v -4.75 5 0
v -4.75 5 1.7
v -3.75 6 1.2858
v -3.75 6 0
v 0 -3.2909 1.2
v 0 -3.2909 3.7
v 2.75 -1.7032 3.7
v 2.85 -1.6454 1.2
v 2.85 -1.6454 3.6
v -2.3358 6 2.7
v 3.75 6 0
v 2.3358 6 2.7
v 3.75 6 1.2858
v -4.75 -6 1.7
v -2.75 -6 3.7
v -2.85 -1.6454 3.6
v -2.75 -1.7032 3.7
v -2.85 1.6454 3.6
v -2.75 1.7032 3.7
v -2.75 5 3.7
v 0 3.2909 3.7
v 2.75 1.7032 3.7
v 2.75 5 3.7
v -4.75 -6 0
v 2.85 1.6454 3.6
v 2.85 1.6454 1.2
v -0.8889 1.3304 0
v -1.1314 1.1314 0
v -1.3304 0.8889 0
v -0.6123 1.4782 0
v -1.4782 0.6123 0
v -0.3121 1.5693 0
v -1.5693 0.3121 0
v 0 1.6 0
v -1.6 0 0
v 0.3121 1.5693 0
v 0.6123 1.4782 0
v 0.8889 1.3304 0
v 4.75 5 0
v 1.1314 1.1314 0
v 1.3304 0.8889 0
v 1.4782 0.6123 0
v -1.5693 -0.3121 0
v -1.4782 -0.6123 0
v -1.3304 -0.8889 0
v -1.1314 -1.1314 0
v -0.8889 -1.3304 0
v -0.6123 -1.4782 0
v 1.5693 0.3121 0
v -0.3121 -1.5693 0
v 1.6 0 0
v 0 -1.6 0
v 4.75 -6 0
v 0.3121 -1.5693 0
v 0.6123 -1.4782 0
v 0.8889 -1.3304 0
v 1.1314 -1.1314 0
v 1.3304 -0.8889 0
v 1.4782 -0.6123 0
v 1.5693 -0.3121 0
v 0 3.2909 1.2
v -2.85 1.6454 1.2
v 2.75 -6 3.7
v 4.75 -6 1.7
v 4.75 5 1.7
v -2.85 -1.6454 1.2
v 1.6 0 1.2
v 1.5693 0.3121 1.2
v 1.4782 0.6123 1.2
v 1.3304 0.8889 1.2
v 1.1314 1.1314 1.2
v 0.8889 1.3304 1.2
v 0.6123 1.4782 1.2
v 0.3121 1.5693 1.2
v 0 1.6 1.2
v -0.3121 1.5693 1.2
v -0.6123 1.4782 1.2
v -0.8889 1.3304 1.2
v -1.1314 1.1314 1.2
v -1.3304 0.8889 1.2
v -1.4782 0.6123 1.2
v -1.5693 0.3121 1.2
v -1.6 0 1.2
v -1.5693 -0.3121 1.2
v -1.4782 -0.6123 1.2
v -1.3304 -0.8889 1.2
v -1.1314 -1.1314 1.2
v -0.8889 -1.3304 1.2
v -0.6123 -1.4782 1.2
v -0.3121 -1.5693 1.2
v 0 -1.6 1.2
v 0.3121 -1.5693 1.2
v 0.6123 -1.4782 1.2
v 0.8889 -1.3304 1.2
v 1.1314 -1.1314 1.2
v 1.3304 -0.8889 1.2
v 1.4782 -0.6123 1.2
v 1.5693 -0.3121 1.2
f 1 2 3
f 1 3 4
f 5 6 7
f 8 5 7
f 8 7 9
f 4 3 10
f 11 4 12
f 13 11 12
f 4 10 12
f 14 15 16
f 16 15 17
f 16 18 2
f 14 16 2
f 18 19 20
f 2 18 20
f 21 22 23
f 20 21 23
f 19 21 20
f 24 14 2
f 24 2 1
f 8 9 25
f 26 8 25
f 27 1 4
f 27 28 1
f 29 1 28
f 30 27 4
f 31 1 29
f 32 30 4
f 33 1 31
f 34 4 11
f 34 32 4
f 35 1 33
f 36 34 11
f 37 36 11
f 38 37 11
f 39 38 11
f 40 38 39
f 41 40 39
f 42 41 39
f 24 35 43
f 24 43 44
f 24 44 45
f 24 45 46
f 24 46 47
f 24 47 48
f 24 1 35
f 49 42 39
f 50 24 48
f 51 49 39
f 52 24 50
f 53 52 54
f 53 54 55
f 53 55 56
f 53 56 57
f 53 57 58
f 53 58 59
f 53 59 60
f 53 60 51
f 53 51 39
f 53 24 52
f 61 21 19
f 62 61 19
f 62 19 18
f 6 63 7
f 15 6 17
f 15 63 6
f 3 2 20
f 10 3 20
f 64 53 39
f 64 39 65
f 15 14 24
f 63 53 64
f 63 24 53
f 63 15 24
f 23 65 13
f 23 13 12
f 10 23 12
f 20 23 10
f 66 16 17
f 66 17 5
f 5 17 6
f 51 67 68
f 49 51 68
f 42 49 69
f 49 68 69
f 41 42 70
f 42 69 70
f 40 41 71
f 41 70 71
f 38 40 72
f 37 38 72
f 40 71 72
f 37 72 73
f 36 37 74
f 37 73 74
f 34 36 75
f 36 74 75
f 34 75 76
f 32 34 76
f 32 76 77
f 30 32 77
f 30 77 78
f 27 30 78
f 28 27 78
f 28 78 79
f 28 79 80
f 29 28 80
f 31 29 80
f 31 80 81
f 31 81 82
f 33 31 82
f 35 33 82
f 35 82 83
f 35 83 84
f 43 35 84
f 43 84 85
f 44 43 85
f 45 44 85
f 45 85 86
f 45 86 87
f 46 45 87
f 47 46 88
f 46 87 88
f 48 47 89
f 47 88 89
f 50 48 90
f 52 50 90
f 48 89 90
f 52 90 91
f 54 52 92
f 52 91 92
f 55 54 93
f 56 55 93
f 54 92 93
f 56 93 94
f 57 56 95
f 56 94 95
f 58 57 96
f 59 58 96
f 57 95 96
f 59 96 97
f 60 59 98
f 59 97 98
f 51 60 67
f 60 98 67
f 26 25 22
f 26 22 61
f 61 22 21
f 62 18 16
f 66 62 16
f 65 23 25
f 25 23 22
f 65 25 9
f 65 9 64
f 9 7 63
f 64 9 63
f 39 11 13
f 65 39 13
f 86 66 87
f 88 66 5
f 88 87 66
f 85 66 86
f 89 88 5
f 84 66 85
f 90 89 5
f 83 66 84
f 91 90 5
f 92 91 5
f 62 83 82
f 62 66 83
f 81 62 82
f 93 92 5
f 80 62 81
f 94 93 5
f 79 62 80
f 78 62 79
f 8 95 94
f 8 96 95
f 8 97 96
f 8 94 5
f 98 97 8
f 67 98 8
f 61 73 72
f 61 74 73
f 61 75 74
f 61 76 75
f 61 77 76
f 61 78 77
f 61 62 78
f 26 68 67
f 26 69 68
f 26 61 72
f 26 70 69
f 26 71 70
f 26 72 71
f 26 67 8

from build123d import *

# Parameters (mm, degrees)
F1_DEPTH = 6
F2_R     = 1.6
F3_DEPTH = 3.7
F5_SIZE2 = 2
F5_SIZE  = 2
F6_DEPTH = 2.5
F7_SIZE  = 1


with BuildPart() as f1:
    # F0 (on Front) → F1 (new body, symmetric)
    with BuildSketch(Plane.XZ):
        Polygon((-4.75, 0), (0, 0), (4.75, 0), (4.75, 3.7), (-4.75, 3.7), align=None)
    extrude(amount=F1_DEPTH, both=True)

    # F2 (on face) → F3 (cut, through all)
    with BuildSketch(Plane.XY.offset(3.7)):
        Circle(F2_R)
    extrude(amount=-F3_DEPTH, mode=Mode.SUBTRACT)

    # F5
    f5_edges = [f1.edges().sort_by_distance(p)[0] for p in [
        (-4.75, 0, 3.7),
        (4.75, 0, 3.7),
    ]]
    chamfer(f5_edges, length=F5_SIZE, length2=F5_SIZE2)

    # F4 (on face) → F6 (cut)
    with BuildSketch(Plane.XY.offset(3.7)):
        Polygon((2.85, -1.6454482672), (2.85, 1.6454482672), (0, 3.2908965344), (-2.85, 1.6454482672), (-2.85, -1.6454482672), (0, -3.2908965344), align=None)
    extrude(amount=-F6_DEPTH, mode=Mode.SUBTRACT)

    # F7
    f7_edges = [f1.edges().sort_by_distance(p)[0] for p in [
        (3.75, 6, 2.7),
        (-3.75, 6, 2.7),
        (-4.75, 6, 0.85),
        (4.75, 6, 0.85),
        (0, 6, 3.7),
    ]]
    chamfer(f7_edges, length=F7_SIZE)


solid = f1.part
